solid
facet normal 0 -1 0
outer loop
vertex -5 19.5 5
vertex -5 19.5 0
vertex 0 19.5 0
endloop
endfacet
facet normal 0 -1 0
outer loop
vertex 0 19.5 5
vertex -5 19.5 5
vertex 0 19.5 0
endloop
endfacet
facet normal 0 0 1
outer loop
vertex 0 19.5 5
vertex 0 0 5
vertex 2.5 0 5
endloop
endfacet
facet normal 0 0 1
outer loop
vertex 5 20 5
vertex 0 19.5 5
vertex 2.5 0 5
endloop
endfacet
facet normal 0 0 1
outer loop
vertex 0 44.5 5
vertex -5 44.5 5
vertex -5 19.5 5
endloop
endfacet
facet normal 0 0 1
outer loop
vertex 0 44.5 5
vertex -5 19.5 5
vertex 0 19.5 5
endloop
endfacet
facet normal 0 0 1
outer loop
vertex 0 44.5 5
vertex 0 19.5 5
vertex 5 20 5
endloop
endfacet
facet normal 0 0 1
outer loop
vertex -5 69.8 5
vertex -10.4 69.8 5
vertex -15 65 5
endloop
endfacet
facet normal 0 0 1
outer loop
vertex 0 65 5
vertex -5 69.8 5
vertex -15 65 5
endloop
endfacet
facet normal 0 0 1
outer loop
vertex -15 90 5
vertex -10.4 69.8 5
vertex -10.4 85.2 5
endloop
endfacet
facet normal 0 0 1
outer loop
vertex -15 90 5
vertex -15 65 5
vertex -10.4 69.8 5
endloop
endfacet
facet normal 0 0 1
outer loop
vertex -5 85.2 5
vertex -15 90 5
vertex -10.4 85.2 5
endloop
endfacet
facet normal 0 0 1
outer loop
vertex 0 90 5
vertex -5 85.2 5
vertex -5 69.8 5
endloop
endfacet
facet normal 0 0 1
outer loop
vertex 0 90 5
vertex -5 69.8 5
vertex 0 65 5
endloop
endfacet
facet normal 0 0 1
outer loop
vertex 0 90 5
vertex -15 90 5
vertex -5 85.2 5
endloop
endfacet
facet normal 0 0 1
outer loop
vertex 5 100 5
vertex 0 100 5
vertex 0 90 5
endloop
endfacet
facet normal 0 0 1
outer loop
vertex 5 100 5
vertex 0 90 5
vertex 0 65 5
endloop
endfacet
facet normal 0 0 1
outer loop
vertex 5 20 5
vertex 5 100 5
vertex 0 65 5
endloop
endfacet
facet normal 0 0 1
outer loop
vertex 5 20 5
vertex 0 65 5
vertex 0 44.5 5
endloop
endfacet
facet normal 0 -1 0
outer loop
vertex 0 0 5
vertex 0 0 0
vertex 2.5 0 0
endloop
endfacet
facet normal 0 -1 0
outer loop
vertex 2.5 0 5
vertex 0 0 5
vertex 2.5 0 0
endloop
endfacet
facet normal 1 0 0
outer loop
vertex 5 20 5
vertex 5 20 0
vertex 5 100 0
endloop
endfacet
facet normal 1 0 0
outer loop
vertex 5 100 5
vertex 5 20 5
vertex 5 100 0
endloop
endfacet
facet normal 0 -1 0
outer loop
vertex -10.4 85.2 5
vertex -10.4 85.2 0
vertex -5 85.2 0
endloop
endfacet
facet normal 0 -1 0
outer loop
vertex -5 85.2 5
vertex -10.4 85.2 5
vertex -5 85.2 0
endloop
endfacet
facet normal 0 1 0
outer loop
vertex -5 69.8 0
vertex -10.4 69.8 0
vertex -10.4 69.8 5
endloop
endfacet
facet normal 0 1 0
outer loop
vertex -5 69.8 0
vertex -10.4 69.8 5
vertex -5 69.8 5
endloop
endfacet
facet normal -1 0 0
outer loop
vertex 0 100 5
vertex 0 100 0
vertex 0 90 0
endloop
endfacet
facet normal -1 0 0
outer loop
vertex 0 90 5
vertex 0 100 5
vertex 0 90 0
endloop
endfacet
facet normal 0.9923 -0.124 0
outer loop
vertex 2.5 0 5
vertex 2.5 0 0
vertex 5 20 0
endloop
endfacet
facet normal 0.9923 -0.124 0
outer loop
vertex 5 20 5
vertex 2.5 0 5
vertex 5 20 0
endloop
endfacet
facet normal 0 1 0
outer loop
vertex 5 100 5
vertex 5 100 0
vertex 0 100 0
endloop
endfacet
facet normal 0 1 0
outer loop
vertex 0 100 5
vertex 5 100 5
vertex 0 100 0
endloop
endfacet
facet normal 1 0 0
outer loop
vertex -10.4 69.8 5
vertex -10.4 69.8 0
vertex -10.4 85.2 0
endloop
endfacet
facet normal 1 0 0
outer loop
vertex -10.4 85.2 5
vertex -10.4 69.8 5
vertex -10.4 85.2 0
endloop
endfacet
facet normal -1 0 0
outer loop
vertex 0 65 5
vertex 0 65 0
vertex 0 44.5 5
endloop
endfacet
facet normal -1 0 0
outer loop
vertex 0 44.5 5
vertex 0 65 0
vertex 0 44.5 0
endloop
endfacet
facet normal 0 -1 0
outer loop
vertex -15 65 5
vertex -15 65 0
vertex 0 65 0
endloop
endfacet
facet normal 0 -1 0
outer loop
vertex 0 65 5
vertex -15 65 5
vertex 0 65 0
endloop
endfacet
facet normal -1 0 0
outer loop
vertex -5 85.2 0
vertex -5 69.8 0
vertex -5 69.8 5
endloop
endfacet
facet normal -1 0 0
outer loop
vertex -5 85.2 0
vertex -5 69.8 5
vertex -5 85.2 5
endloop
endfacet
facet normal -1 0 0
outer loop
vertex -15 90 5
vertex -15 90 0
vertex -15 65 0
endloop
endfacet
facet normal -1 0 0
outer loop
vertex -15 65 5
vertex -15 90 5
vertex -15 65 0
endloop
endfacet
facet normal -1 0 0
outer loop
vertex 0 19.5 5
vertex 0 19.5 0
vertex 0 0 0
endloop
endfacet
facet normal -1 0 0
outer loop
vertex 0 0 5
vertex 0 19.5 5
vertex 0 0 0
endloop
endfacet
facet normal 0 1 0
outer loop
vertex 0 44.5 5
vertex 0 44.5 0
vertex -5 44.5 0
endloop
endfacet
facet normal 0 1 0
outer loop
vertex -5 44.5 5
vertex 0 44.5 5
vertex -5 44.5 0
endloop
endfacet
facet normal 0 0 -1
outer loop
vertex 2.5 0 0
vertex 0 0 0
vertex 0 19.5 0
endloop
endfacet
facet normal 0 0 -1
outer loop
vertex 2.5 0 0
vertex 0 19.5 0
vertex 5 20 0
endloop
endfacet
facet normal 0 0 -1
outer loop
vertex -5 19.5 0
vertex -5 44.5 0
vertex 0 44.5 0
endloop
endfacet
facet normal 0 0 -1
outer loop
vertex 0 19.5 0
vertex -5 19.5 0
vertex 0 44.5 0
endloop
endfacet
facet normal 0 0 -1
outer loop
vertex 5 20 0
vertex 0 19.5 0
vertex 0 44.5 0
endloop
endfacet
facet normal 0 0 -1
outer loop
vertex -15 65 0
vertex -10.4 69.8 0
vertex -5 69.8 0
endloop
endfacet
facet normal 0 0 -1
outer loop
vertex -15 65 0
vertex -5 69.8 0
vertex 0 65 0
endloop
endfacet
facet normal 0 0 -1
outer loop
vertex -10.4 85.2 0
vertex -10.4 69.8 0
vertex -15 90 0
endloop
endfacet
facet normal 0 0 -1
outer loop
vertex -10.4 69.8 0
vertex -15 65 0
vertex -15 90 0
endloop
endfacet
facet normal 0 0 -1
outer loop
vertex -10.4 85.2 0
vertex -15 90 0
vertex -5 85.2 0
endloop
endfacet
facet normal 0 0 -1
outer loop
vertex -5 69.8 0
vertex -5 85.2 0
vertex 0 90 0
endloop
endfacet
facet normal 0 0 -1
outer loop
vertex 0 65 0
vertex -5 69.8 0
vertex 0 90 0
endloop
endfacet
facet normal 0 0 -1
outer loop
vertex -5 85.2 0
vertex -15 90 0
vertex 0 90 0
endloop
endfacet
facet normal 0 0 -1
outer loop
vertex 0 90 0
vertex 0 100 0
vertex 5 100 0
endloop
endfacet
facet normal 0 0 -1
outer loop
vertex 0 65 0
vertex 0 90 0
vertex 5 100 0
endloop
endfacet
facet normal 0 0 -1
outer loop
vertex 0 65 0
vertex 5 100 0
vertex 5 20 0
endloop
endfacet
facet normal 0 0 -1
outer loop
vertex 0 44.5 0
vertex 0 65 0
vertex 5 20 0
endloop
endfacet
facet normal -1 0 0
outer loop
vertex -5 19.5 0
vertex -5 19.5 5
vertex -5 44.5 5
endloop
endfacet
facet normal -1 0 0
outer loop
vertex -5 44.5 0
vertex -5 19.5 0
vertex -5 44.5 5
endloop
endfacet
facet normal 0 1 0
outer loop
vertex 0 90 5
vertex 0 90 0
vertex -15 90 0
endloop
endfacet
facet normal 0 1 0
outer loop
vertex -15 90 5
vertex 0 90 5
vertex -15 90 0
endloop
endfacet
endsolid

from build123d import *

# Parameters (mm, degrees)
SKETCH1_W           = 5.4
SKETCH1_H           = 15.4
SKETCH1_W_2         = 5
SKETCH1_H_2         = 15
BOSS_EXTRUDE1_DEPTH = 5
SKETCH2_W           = 10
SKETCH2_H           = 25
CUT_EXTRUDE1_DEPTH  = 10


with BuildPart() as part:
    # Sketch1 → Boss-Extrude1 (new body)
    with BuildSketch(Plane.XY):
        Polygon((0, 0), (2.5, 0), (5, 20), (5, 100), (0, 100), (0, 90), (-15, 90), (-15, 65), (0, 65), (0, 44.5), (-15, 44.5), (-15, 19.5), (0, 19.5), align=None)
        with Locations((-7.7, 77.5)):
            Rectangle(SKETCH1_W, SKETCH1_H, mode=Mode.SUBTRACT)
        with Locations((-7.5, 32)):
            Rectangle(SKETCH1_W_2, SKETCH1_H_2, mode=Mode.SUBTRACT)
    extrude(amount=BOSS_EXTRUDE1_DEPTH)

    # Sketch2 → Cut-Extrude1 (cut)
    with BuildSketch(Plane.XY.offset(5)):
        with Locations((-10, 32)):
            Rectangle(SKETCH2_W, SKETCH2_H)
    extrude(amount=-CUT_EXTRUDE1_DEPTH, mode=Mode.SUBTRACT)


solid = part.part
